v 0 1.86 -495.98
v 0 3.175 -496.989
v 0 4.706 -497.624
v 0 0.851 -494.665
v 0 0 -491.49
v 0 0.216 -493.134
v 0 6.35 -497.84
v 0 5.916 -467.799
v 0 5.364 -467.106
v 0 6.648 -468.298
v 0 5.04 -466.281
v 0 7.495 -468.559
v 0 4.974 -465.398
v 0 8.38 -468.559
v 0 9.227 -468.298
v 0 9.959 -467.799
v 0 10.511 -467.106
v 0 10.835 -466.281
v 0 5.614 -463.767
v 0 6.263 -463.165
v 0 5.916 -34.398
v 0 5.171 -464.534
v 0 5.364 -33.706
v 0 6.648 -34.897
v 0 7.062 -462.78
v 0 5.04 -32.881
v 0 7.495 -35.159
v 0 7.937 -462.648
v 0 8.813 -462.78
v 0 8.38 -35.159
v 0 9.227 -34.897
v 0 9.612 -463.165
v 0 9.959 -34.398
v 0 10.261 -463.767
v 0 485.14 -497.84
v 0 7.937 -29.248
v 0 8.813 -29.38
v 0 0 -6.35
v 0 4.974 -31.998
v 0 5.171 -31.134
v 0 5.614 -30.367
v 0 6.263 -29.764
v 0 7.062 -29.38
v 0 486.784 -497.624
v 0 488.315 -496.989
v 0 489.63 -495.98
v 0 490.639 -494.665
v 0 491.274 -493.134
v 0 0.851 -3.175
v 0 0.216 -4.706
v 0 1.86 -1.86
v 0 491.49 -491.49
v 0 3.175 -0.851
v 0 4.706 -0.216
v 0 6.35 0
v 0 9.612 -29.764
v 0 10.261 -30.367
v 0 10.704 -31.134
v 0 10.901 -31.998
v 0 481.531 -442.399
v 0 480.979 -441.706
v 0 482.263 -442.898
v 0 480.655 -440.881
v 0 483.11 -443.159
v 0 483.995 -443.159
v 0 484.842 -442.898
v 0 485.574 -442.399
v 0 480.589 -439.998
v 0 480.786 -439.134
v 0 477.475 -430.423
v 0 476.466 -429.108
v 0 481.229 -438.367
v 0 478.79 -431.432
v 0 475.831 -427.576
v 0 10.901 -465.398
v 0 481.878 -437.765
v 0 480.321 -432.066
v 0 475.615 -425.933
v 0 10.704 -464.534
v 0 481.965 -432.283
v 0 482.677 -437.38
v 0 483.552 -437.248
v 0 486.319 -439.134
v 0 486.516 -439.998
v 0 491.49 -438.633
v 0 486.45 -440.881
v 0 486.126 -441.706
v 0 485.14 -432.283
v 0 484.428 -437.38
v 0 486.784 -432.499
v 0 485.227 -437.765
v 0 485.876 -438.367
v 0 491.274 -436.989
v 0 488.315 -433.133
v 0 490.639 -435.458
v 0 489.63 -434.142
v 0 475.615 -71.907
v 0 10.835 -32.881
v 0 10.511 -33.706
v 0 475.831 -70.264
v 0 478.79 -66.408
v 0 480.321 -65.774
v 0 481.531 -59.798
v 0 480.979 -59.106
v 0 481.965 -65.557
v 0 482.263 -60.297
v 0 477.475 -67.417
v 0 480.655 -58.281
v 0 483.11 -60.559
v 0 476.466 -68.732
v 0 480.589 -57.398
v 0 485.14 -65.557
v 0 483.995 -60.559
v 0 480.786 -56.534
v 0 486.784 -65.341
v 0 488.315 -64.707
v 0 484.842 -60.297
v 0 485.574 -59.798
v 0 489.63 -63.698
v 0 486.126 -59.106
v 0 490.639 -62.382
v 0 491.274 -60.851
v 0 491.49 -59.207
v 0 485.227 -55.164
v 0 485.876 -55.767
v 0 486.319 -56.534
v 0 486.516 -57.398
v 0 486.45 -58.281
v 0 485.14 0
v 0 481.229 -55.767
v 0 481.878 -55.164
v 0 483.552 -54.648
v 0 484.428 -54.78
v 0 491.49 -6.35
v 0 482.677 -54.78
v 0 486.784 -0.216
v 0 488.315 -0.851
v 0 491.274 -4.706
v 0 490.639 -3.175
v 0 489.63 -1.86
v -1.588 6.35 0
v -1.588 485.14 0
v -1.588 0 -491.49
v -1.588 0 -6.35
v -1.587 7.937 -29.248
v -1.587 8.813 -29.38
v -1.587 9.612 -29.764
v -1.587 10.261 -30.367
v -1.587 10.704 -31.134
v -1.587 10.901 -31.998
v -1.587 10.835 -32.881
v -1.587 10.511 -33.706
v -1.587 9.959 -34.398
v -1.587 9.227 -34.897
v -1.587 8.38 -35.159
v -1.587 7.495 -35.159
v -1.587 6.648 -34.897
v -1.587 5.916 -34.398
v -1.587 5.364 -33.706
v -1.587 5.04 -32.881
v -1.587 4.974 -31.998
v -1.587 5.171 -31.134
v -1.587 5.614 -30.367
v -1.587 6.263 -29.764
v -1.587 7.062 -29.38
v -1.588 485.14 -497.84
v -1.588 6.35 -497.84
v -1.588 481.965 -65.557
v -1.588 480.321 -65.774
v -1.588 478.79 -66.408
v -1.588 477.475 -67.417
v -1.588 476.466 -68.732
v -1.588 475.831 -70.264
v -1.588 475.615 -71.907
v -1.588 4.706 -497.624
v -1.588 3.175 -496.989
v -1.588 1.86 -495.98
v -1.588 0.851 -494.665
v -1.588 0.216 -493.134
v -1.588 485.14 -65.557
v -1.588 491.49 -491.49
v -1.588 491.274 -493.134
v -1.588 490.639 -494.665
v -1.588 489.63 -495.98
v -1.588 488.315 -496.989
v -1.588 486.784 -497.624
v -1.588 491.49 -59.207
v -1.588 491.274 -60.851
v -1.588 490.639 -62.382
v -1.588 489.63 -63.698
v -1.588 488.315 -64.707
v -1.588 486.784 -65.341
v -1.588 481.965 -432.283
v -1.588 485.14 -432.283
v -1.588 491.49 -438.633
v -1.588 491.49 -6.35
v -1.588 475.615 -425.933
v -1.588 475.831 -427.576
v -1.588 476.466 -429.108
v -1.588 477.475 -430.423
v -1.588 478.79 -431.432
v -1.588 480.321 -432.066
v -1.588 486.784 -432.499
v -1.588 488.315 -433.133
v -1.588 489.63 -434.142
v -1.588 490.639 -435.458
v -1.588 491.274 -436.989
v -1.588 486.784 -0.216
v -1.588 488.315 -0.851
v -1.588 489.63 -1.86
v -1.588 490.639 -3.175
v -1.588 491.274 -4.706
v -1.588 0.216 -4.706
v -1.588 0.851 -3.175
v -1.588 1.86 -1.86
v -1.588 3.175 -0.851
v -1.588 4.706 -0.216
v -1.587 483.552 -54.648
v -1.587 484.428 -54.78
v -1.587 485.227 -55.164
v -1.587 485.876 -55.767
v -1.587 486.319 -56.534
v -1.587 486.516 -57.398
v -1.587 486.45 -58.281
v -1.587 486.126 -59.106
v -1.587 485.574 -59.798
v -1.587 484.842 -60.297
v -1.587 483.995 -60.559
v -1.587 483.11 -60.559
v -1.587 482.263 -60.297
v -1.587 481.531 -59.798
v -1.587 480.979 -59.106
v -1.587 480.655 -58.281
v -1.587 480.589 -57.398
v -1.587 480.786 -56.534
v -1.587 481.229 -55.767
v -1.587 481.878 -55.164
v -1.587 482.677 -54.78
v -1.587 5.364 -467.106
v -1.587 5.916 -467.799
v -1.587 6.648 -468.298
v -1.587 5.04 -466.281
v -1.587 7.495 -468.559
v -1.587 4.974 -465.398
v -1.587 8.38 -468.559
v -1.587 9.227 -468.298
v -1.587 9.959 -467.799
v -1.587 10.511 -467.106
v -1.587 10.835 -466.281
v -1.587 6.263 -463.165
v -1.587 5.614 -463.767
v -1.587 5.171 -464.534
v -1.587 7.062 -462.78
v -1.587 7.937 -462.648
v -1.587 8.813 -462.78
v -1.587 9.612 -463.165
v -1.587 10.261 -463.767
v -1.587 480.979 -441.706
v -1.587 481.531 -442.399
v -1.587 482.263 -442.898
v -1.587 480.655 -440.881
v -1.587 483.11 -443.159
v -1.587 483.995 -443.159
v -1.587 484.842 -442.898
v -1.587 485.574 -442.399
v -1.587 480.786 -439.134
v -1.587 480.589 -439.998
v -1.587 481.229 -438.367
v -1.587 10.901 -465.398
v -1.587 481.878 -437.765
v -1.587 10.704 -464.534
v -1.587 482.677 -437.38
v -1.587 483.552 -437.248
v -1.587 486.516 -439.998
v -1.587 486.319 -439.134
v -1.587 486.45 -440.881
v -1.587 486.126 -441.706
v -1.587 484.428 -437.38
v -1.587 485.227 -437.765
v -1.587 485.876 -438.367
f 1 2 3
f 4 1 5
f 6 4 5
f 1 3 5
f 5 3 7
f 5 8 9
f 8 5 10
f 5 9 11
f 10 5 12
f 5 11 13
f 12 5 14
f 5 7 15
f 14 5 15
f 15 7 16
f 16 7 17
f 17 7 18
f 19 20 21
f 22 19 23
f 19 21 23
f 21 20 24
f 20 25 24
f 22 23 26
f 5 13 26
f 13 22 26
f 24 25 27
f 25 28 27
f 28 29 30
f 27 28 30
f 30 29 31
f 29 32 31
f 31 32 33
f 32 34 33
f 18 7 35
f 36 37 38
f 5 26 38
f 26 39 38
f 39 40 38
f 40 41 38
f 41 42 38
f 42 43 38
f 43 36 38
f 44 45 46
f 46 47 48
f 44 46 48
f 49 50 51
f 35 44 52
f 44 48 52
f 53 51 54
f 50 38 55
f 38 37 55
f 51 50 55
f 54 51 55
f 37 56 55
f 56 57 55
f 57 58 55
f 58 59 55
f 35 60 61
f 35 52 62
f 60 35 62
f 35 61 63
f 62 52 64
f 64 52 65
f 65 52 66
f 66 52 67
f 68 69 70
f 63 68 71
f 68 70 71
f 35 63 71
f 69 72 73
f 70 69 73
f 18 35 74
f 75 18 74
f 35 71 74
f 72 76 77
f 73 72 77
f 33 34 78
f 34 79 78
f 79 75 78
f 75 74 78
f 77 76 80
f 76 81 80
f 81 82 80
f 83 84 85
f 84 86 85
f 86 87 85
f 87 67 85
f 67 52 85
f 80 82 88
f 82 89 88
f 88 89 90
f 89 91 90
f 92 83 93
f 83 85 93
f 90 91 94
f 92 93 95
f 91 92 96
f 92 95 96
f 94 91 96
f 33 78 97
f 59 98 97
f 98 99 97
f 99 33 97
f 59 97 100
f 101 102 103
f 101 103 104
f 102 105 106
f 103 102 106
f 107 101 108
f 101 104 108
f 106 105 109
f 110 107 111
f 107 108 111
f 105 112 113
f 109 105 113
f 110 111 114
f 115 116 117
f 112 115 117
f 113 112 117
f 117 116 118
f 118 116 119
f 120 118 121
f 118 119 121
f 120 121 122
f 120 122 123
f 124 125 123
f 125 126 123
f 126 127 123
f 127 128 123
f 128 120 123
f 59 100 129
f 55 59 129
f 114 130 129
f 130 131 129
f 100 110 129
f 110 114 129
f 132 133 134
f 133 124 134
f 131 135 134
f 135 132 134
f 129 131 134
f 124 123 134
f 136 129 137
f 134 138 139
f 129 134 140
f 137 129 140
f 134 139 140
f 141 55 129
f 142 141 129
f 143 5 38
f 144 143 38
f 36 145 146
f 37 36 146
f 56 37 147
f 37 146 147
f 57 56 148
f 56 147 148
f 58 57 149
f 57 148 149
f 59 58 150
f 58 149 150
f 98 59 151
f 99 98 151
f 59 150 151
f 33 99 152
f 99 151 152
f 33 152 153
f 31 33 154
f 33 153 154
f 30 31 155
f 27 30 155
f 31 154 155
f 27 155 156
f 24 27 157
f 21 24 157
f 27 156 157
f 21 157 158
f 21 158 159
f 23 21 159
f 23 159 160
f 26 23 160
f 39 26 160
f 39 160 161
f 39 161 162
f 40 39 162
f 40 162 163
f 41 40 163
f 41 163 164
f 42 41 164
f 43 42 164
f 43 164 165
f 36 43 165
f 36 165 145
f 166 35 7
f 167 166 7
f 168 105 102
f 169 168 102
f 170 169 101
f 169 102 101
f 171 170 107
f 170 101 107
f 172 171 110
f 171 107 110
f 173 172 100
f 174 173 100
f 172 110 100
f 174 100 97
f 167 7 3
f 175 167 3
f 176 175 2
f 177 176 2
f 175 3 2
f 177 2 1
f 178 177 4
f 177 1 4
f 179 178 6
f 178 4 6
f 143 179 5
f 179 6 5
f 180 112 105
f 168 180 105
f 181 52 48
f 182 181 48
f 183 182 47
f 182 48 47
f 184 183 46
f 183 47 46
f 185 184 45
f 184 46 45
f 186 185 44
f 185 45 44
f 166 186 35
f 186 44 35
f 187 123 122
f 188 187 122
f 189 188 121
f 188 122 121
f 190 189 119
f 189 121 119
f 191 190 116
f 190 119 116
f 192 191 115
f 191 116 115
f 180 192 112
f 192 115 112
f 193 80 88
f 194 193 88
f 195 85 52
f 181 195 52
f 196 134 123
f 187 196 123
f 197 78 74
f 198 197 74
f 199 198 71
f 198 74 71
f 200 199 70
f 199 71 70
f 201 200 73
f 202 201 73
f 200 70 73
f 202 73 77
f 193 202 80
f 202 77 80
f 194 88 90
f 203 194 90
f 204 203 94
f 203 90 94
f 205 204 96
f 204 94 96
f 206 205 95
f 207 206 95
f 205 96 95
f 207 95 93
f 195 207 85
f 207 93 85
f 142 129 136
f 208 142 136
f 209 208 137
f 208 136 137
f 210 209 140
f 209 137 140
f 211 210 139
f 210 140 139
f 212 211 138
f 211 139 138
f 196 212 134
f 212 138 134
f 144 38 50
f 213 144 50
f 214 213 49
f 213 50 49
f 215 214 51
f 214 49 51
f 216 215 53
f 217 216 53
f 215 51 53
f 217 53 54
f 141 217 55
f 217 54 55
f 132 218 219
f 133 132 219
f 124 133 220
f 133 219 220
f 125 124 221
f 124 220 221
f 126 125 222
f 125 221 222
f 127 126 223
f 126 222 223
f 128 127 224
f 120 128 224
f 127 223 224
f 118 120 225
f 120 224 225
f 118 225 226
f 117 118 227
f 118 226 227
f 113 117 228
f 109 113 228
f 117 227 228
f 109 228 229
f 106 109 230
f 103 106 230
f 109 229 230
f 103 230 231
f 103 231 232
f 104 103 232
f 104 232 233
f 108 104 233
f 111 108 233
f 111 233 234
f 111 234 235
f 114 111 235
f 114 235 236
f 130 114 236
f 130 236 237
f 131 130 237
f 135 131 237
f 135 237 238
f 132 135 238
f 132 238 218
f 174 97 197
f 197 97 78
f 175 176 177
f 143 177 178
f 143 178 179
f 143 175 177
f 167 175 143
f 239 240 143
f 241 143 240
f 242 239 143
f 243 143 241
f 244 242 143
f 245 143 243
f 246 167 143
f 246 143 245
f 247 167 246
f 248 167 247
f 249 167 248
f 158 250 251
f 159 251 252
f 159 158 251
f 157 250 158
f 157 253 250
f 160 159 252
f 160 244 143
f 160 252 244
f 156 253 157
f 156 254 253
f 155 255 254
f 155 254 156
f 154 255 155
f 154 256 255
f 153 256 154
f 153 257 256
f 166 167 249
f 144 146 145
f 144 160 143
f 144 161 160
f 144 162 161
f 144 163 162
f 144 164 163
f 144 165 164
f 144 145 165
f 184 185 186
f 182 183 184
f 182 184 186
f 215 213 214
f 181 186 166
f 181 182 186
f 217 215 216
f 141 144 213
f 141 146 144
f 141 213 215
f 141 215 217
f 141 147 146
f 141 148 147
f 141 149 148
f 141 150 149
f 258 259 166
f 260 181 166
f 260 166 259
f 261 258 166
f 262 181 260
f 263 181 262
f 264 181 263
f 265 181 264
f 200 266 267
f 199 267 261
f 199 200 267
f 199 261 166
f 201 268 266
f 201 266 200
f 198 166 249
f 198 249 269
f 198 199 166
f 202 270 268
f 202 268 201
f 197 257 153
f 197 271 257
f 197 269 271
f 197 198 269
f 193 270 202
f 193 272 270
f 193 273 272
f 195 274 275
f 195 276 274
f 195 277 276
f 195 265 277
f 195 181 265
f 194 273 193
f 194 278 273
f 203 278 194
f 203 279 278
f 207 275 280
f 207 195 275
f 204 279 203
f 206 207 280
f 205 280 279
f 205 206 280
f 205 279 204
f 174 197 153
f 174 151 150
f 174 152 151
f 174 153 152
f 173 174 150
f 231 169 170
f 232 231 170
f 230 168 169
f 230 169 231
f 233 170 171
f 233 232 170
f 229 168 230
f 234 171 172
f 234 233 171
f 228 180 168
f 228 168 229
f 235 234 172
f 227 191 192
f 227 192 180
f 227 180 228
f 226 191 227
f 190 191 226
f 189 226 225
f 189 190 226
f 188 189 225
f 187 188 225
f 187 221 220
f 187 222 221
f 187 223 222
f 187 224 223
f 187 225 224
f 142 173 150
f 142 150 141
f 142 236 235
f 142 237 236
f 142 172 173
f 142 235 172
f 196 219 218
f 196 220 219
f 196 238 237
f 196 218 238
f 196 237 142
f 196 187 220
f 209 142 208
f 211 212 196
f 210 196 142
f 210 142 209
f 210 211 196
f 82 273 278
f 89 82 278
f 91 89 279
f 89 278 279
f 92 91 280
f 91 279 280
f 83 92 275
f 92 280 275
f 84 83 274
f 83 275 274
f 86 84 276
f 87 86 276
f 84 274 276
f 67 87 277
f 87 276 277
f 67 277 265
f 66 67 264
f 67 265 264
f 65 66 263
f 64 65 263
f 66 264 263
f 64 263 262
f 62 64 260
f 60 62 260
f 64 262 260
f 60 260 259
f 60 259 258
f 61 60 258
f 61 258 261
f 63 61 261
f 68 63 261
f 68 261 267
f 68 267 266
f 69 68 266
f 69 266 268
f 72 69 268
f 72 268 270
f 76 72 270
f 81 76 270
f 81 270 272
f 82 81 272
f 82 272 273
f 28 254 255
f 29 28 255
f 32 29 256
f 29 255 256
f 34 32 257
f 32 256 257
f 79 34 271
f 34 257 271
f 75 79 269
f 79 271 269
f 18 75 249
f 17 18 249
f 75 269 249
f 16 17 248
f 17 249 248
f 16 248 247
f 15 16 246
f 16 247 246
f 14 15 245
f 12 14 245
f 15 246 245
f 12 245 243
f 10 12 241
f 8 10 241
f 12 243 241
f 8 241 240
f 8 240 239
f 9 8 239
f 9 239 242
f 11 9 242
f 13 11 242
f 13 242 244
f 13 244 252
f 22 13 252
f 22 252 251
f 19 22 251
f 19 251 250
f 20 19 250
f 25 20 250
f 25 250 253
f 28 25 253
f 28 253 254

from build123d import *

# Parameters (mm, degrees)
BOSS_EXTRUDE1_DEPTH      = 1.5875
A_0_234_DIAMETER_HOLE1_D = 5.9436


with BuildPart() as part:
    # Sketch1 → Boss-Extrude1 (new body)
    with BuildSketch(Plane(origin=(0, 0, 0), x_dir=(0, 0, -1), z_dir=(1, 0, 0))):
        with BuildLine():
            Line((438.6326, 491.49), (491.49, 491.49))
            ThreePointArc((491.49, 491.49), (495.980128061, 489.630128061), (497.84, 485.14))
            Line((497.84, 485.14), (497.84, 6.35))
            ThreePointArc((497.84, 6.35), (495.980128061, 1.859871939), (491.49, 0))
            Line((491.49, 0), (6.35, 0))
            ThreePointArc((6.35, 0), (1.859871939, 1.859871939), (0, 6.35))
            Line((0, 6.35), (0, 485.14))
            ThreePointArc((0, 485.14), (1.859871939, 489.630128061), (6.35, 491.49))
            Line((6.35, 491.49), (59.2074, 491.49))
            ThreePointArc((59.2074, 491.49), (63.697528061, 489.630128061), (65.5574, 485.14))
            Line((65.5574, 485.14), (65.5574, 481.965))
            ThreePointArc((65.5574, 481.965), (67.417271939, 477.474871939), (71.9074, 475.615))
            Line((71.9074, 475.615), (425.9326, 475.615))
            ThreePointArc((425.9326, 475.615), (430.422728061, 477.474871939), (432.2826, 481.965))
            Line((432.2826, 481.965), (432.2826, 485.14))
            ThreePointArc((432.2826, 485.14), (434.142471939, 489.630128061), (438.6326, 491.49))
        make_face()
    extrude(amount=-BOSS_EXTRUDE1_DEPTH)

    # A (0.234) Diameter Hole1 (through all)
    with Locations(Plane(origin=(1.02362, -1353.361752646, -2205.813131805), x_dir=(0, 0, -1), z_dir=(1, 0, 0))):
        with Locations((-2173.593231805, 1361.299252646), (-1740.193031805, 1361.29924771), (-1765.593031805, 1836.91424771), (-2148.193231805, 1836.91424771)):
            Hole(A_0_234_DIAMETER_HOLE1_D / 2)


solid = part.part
